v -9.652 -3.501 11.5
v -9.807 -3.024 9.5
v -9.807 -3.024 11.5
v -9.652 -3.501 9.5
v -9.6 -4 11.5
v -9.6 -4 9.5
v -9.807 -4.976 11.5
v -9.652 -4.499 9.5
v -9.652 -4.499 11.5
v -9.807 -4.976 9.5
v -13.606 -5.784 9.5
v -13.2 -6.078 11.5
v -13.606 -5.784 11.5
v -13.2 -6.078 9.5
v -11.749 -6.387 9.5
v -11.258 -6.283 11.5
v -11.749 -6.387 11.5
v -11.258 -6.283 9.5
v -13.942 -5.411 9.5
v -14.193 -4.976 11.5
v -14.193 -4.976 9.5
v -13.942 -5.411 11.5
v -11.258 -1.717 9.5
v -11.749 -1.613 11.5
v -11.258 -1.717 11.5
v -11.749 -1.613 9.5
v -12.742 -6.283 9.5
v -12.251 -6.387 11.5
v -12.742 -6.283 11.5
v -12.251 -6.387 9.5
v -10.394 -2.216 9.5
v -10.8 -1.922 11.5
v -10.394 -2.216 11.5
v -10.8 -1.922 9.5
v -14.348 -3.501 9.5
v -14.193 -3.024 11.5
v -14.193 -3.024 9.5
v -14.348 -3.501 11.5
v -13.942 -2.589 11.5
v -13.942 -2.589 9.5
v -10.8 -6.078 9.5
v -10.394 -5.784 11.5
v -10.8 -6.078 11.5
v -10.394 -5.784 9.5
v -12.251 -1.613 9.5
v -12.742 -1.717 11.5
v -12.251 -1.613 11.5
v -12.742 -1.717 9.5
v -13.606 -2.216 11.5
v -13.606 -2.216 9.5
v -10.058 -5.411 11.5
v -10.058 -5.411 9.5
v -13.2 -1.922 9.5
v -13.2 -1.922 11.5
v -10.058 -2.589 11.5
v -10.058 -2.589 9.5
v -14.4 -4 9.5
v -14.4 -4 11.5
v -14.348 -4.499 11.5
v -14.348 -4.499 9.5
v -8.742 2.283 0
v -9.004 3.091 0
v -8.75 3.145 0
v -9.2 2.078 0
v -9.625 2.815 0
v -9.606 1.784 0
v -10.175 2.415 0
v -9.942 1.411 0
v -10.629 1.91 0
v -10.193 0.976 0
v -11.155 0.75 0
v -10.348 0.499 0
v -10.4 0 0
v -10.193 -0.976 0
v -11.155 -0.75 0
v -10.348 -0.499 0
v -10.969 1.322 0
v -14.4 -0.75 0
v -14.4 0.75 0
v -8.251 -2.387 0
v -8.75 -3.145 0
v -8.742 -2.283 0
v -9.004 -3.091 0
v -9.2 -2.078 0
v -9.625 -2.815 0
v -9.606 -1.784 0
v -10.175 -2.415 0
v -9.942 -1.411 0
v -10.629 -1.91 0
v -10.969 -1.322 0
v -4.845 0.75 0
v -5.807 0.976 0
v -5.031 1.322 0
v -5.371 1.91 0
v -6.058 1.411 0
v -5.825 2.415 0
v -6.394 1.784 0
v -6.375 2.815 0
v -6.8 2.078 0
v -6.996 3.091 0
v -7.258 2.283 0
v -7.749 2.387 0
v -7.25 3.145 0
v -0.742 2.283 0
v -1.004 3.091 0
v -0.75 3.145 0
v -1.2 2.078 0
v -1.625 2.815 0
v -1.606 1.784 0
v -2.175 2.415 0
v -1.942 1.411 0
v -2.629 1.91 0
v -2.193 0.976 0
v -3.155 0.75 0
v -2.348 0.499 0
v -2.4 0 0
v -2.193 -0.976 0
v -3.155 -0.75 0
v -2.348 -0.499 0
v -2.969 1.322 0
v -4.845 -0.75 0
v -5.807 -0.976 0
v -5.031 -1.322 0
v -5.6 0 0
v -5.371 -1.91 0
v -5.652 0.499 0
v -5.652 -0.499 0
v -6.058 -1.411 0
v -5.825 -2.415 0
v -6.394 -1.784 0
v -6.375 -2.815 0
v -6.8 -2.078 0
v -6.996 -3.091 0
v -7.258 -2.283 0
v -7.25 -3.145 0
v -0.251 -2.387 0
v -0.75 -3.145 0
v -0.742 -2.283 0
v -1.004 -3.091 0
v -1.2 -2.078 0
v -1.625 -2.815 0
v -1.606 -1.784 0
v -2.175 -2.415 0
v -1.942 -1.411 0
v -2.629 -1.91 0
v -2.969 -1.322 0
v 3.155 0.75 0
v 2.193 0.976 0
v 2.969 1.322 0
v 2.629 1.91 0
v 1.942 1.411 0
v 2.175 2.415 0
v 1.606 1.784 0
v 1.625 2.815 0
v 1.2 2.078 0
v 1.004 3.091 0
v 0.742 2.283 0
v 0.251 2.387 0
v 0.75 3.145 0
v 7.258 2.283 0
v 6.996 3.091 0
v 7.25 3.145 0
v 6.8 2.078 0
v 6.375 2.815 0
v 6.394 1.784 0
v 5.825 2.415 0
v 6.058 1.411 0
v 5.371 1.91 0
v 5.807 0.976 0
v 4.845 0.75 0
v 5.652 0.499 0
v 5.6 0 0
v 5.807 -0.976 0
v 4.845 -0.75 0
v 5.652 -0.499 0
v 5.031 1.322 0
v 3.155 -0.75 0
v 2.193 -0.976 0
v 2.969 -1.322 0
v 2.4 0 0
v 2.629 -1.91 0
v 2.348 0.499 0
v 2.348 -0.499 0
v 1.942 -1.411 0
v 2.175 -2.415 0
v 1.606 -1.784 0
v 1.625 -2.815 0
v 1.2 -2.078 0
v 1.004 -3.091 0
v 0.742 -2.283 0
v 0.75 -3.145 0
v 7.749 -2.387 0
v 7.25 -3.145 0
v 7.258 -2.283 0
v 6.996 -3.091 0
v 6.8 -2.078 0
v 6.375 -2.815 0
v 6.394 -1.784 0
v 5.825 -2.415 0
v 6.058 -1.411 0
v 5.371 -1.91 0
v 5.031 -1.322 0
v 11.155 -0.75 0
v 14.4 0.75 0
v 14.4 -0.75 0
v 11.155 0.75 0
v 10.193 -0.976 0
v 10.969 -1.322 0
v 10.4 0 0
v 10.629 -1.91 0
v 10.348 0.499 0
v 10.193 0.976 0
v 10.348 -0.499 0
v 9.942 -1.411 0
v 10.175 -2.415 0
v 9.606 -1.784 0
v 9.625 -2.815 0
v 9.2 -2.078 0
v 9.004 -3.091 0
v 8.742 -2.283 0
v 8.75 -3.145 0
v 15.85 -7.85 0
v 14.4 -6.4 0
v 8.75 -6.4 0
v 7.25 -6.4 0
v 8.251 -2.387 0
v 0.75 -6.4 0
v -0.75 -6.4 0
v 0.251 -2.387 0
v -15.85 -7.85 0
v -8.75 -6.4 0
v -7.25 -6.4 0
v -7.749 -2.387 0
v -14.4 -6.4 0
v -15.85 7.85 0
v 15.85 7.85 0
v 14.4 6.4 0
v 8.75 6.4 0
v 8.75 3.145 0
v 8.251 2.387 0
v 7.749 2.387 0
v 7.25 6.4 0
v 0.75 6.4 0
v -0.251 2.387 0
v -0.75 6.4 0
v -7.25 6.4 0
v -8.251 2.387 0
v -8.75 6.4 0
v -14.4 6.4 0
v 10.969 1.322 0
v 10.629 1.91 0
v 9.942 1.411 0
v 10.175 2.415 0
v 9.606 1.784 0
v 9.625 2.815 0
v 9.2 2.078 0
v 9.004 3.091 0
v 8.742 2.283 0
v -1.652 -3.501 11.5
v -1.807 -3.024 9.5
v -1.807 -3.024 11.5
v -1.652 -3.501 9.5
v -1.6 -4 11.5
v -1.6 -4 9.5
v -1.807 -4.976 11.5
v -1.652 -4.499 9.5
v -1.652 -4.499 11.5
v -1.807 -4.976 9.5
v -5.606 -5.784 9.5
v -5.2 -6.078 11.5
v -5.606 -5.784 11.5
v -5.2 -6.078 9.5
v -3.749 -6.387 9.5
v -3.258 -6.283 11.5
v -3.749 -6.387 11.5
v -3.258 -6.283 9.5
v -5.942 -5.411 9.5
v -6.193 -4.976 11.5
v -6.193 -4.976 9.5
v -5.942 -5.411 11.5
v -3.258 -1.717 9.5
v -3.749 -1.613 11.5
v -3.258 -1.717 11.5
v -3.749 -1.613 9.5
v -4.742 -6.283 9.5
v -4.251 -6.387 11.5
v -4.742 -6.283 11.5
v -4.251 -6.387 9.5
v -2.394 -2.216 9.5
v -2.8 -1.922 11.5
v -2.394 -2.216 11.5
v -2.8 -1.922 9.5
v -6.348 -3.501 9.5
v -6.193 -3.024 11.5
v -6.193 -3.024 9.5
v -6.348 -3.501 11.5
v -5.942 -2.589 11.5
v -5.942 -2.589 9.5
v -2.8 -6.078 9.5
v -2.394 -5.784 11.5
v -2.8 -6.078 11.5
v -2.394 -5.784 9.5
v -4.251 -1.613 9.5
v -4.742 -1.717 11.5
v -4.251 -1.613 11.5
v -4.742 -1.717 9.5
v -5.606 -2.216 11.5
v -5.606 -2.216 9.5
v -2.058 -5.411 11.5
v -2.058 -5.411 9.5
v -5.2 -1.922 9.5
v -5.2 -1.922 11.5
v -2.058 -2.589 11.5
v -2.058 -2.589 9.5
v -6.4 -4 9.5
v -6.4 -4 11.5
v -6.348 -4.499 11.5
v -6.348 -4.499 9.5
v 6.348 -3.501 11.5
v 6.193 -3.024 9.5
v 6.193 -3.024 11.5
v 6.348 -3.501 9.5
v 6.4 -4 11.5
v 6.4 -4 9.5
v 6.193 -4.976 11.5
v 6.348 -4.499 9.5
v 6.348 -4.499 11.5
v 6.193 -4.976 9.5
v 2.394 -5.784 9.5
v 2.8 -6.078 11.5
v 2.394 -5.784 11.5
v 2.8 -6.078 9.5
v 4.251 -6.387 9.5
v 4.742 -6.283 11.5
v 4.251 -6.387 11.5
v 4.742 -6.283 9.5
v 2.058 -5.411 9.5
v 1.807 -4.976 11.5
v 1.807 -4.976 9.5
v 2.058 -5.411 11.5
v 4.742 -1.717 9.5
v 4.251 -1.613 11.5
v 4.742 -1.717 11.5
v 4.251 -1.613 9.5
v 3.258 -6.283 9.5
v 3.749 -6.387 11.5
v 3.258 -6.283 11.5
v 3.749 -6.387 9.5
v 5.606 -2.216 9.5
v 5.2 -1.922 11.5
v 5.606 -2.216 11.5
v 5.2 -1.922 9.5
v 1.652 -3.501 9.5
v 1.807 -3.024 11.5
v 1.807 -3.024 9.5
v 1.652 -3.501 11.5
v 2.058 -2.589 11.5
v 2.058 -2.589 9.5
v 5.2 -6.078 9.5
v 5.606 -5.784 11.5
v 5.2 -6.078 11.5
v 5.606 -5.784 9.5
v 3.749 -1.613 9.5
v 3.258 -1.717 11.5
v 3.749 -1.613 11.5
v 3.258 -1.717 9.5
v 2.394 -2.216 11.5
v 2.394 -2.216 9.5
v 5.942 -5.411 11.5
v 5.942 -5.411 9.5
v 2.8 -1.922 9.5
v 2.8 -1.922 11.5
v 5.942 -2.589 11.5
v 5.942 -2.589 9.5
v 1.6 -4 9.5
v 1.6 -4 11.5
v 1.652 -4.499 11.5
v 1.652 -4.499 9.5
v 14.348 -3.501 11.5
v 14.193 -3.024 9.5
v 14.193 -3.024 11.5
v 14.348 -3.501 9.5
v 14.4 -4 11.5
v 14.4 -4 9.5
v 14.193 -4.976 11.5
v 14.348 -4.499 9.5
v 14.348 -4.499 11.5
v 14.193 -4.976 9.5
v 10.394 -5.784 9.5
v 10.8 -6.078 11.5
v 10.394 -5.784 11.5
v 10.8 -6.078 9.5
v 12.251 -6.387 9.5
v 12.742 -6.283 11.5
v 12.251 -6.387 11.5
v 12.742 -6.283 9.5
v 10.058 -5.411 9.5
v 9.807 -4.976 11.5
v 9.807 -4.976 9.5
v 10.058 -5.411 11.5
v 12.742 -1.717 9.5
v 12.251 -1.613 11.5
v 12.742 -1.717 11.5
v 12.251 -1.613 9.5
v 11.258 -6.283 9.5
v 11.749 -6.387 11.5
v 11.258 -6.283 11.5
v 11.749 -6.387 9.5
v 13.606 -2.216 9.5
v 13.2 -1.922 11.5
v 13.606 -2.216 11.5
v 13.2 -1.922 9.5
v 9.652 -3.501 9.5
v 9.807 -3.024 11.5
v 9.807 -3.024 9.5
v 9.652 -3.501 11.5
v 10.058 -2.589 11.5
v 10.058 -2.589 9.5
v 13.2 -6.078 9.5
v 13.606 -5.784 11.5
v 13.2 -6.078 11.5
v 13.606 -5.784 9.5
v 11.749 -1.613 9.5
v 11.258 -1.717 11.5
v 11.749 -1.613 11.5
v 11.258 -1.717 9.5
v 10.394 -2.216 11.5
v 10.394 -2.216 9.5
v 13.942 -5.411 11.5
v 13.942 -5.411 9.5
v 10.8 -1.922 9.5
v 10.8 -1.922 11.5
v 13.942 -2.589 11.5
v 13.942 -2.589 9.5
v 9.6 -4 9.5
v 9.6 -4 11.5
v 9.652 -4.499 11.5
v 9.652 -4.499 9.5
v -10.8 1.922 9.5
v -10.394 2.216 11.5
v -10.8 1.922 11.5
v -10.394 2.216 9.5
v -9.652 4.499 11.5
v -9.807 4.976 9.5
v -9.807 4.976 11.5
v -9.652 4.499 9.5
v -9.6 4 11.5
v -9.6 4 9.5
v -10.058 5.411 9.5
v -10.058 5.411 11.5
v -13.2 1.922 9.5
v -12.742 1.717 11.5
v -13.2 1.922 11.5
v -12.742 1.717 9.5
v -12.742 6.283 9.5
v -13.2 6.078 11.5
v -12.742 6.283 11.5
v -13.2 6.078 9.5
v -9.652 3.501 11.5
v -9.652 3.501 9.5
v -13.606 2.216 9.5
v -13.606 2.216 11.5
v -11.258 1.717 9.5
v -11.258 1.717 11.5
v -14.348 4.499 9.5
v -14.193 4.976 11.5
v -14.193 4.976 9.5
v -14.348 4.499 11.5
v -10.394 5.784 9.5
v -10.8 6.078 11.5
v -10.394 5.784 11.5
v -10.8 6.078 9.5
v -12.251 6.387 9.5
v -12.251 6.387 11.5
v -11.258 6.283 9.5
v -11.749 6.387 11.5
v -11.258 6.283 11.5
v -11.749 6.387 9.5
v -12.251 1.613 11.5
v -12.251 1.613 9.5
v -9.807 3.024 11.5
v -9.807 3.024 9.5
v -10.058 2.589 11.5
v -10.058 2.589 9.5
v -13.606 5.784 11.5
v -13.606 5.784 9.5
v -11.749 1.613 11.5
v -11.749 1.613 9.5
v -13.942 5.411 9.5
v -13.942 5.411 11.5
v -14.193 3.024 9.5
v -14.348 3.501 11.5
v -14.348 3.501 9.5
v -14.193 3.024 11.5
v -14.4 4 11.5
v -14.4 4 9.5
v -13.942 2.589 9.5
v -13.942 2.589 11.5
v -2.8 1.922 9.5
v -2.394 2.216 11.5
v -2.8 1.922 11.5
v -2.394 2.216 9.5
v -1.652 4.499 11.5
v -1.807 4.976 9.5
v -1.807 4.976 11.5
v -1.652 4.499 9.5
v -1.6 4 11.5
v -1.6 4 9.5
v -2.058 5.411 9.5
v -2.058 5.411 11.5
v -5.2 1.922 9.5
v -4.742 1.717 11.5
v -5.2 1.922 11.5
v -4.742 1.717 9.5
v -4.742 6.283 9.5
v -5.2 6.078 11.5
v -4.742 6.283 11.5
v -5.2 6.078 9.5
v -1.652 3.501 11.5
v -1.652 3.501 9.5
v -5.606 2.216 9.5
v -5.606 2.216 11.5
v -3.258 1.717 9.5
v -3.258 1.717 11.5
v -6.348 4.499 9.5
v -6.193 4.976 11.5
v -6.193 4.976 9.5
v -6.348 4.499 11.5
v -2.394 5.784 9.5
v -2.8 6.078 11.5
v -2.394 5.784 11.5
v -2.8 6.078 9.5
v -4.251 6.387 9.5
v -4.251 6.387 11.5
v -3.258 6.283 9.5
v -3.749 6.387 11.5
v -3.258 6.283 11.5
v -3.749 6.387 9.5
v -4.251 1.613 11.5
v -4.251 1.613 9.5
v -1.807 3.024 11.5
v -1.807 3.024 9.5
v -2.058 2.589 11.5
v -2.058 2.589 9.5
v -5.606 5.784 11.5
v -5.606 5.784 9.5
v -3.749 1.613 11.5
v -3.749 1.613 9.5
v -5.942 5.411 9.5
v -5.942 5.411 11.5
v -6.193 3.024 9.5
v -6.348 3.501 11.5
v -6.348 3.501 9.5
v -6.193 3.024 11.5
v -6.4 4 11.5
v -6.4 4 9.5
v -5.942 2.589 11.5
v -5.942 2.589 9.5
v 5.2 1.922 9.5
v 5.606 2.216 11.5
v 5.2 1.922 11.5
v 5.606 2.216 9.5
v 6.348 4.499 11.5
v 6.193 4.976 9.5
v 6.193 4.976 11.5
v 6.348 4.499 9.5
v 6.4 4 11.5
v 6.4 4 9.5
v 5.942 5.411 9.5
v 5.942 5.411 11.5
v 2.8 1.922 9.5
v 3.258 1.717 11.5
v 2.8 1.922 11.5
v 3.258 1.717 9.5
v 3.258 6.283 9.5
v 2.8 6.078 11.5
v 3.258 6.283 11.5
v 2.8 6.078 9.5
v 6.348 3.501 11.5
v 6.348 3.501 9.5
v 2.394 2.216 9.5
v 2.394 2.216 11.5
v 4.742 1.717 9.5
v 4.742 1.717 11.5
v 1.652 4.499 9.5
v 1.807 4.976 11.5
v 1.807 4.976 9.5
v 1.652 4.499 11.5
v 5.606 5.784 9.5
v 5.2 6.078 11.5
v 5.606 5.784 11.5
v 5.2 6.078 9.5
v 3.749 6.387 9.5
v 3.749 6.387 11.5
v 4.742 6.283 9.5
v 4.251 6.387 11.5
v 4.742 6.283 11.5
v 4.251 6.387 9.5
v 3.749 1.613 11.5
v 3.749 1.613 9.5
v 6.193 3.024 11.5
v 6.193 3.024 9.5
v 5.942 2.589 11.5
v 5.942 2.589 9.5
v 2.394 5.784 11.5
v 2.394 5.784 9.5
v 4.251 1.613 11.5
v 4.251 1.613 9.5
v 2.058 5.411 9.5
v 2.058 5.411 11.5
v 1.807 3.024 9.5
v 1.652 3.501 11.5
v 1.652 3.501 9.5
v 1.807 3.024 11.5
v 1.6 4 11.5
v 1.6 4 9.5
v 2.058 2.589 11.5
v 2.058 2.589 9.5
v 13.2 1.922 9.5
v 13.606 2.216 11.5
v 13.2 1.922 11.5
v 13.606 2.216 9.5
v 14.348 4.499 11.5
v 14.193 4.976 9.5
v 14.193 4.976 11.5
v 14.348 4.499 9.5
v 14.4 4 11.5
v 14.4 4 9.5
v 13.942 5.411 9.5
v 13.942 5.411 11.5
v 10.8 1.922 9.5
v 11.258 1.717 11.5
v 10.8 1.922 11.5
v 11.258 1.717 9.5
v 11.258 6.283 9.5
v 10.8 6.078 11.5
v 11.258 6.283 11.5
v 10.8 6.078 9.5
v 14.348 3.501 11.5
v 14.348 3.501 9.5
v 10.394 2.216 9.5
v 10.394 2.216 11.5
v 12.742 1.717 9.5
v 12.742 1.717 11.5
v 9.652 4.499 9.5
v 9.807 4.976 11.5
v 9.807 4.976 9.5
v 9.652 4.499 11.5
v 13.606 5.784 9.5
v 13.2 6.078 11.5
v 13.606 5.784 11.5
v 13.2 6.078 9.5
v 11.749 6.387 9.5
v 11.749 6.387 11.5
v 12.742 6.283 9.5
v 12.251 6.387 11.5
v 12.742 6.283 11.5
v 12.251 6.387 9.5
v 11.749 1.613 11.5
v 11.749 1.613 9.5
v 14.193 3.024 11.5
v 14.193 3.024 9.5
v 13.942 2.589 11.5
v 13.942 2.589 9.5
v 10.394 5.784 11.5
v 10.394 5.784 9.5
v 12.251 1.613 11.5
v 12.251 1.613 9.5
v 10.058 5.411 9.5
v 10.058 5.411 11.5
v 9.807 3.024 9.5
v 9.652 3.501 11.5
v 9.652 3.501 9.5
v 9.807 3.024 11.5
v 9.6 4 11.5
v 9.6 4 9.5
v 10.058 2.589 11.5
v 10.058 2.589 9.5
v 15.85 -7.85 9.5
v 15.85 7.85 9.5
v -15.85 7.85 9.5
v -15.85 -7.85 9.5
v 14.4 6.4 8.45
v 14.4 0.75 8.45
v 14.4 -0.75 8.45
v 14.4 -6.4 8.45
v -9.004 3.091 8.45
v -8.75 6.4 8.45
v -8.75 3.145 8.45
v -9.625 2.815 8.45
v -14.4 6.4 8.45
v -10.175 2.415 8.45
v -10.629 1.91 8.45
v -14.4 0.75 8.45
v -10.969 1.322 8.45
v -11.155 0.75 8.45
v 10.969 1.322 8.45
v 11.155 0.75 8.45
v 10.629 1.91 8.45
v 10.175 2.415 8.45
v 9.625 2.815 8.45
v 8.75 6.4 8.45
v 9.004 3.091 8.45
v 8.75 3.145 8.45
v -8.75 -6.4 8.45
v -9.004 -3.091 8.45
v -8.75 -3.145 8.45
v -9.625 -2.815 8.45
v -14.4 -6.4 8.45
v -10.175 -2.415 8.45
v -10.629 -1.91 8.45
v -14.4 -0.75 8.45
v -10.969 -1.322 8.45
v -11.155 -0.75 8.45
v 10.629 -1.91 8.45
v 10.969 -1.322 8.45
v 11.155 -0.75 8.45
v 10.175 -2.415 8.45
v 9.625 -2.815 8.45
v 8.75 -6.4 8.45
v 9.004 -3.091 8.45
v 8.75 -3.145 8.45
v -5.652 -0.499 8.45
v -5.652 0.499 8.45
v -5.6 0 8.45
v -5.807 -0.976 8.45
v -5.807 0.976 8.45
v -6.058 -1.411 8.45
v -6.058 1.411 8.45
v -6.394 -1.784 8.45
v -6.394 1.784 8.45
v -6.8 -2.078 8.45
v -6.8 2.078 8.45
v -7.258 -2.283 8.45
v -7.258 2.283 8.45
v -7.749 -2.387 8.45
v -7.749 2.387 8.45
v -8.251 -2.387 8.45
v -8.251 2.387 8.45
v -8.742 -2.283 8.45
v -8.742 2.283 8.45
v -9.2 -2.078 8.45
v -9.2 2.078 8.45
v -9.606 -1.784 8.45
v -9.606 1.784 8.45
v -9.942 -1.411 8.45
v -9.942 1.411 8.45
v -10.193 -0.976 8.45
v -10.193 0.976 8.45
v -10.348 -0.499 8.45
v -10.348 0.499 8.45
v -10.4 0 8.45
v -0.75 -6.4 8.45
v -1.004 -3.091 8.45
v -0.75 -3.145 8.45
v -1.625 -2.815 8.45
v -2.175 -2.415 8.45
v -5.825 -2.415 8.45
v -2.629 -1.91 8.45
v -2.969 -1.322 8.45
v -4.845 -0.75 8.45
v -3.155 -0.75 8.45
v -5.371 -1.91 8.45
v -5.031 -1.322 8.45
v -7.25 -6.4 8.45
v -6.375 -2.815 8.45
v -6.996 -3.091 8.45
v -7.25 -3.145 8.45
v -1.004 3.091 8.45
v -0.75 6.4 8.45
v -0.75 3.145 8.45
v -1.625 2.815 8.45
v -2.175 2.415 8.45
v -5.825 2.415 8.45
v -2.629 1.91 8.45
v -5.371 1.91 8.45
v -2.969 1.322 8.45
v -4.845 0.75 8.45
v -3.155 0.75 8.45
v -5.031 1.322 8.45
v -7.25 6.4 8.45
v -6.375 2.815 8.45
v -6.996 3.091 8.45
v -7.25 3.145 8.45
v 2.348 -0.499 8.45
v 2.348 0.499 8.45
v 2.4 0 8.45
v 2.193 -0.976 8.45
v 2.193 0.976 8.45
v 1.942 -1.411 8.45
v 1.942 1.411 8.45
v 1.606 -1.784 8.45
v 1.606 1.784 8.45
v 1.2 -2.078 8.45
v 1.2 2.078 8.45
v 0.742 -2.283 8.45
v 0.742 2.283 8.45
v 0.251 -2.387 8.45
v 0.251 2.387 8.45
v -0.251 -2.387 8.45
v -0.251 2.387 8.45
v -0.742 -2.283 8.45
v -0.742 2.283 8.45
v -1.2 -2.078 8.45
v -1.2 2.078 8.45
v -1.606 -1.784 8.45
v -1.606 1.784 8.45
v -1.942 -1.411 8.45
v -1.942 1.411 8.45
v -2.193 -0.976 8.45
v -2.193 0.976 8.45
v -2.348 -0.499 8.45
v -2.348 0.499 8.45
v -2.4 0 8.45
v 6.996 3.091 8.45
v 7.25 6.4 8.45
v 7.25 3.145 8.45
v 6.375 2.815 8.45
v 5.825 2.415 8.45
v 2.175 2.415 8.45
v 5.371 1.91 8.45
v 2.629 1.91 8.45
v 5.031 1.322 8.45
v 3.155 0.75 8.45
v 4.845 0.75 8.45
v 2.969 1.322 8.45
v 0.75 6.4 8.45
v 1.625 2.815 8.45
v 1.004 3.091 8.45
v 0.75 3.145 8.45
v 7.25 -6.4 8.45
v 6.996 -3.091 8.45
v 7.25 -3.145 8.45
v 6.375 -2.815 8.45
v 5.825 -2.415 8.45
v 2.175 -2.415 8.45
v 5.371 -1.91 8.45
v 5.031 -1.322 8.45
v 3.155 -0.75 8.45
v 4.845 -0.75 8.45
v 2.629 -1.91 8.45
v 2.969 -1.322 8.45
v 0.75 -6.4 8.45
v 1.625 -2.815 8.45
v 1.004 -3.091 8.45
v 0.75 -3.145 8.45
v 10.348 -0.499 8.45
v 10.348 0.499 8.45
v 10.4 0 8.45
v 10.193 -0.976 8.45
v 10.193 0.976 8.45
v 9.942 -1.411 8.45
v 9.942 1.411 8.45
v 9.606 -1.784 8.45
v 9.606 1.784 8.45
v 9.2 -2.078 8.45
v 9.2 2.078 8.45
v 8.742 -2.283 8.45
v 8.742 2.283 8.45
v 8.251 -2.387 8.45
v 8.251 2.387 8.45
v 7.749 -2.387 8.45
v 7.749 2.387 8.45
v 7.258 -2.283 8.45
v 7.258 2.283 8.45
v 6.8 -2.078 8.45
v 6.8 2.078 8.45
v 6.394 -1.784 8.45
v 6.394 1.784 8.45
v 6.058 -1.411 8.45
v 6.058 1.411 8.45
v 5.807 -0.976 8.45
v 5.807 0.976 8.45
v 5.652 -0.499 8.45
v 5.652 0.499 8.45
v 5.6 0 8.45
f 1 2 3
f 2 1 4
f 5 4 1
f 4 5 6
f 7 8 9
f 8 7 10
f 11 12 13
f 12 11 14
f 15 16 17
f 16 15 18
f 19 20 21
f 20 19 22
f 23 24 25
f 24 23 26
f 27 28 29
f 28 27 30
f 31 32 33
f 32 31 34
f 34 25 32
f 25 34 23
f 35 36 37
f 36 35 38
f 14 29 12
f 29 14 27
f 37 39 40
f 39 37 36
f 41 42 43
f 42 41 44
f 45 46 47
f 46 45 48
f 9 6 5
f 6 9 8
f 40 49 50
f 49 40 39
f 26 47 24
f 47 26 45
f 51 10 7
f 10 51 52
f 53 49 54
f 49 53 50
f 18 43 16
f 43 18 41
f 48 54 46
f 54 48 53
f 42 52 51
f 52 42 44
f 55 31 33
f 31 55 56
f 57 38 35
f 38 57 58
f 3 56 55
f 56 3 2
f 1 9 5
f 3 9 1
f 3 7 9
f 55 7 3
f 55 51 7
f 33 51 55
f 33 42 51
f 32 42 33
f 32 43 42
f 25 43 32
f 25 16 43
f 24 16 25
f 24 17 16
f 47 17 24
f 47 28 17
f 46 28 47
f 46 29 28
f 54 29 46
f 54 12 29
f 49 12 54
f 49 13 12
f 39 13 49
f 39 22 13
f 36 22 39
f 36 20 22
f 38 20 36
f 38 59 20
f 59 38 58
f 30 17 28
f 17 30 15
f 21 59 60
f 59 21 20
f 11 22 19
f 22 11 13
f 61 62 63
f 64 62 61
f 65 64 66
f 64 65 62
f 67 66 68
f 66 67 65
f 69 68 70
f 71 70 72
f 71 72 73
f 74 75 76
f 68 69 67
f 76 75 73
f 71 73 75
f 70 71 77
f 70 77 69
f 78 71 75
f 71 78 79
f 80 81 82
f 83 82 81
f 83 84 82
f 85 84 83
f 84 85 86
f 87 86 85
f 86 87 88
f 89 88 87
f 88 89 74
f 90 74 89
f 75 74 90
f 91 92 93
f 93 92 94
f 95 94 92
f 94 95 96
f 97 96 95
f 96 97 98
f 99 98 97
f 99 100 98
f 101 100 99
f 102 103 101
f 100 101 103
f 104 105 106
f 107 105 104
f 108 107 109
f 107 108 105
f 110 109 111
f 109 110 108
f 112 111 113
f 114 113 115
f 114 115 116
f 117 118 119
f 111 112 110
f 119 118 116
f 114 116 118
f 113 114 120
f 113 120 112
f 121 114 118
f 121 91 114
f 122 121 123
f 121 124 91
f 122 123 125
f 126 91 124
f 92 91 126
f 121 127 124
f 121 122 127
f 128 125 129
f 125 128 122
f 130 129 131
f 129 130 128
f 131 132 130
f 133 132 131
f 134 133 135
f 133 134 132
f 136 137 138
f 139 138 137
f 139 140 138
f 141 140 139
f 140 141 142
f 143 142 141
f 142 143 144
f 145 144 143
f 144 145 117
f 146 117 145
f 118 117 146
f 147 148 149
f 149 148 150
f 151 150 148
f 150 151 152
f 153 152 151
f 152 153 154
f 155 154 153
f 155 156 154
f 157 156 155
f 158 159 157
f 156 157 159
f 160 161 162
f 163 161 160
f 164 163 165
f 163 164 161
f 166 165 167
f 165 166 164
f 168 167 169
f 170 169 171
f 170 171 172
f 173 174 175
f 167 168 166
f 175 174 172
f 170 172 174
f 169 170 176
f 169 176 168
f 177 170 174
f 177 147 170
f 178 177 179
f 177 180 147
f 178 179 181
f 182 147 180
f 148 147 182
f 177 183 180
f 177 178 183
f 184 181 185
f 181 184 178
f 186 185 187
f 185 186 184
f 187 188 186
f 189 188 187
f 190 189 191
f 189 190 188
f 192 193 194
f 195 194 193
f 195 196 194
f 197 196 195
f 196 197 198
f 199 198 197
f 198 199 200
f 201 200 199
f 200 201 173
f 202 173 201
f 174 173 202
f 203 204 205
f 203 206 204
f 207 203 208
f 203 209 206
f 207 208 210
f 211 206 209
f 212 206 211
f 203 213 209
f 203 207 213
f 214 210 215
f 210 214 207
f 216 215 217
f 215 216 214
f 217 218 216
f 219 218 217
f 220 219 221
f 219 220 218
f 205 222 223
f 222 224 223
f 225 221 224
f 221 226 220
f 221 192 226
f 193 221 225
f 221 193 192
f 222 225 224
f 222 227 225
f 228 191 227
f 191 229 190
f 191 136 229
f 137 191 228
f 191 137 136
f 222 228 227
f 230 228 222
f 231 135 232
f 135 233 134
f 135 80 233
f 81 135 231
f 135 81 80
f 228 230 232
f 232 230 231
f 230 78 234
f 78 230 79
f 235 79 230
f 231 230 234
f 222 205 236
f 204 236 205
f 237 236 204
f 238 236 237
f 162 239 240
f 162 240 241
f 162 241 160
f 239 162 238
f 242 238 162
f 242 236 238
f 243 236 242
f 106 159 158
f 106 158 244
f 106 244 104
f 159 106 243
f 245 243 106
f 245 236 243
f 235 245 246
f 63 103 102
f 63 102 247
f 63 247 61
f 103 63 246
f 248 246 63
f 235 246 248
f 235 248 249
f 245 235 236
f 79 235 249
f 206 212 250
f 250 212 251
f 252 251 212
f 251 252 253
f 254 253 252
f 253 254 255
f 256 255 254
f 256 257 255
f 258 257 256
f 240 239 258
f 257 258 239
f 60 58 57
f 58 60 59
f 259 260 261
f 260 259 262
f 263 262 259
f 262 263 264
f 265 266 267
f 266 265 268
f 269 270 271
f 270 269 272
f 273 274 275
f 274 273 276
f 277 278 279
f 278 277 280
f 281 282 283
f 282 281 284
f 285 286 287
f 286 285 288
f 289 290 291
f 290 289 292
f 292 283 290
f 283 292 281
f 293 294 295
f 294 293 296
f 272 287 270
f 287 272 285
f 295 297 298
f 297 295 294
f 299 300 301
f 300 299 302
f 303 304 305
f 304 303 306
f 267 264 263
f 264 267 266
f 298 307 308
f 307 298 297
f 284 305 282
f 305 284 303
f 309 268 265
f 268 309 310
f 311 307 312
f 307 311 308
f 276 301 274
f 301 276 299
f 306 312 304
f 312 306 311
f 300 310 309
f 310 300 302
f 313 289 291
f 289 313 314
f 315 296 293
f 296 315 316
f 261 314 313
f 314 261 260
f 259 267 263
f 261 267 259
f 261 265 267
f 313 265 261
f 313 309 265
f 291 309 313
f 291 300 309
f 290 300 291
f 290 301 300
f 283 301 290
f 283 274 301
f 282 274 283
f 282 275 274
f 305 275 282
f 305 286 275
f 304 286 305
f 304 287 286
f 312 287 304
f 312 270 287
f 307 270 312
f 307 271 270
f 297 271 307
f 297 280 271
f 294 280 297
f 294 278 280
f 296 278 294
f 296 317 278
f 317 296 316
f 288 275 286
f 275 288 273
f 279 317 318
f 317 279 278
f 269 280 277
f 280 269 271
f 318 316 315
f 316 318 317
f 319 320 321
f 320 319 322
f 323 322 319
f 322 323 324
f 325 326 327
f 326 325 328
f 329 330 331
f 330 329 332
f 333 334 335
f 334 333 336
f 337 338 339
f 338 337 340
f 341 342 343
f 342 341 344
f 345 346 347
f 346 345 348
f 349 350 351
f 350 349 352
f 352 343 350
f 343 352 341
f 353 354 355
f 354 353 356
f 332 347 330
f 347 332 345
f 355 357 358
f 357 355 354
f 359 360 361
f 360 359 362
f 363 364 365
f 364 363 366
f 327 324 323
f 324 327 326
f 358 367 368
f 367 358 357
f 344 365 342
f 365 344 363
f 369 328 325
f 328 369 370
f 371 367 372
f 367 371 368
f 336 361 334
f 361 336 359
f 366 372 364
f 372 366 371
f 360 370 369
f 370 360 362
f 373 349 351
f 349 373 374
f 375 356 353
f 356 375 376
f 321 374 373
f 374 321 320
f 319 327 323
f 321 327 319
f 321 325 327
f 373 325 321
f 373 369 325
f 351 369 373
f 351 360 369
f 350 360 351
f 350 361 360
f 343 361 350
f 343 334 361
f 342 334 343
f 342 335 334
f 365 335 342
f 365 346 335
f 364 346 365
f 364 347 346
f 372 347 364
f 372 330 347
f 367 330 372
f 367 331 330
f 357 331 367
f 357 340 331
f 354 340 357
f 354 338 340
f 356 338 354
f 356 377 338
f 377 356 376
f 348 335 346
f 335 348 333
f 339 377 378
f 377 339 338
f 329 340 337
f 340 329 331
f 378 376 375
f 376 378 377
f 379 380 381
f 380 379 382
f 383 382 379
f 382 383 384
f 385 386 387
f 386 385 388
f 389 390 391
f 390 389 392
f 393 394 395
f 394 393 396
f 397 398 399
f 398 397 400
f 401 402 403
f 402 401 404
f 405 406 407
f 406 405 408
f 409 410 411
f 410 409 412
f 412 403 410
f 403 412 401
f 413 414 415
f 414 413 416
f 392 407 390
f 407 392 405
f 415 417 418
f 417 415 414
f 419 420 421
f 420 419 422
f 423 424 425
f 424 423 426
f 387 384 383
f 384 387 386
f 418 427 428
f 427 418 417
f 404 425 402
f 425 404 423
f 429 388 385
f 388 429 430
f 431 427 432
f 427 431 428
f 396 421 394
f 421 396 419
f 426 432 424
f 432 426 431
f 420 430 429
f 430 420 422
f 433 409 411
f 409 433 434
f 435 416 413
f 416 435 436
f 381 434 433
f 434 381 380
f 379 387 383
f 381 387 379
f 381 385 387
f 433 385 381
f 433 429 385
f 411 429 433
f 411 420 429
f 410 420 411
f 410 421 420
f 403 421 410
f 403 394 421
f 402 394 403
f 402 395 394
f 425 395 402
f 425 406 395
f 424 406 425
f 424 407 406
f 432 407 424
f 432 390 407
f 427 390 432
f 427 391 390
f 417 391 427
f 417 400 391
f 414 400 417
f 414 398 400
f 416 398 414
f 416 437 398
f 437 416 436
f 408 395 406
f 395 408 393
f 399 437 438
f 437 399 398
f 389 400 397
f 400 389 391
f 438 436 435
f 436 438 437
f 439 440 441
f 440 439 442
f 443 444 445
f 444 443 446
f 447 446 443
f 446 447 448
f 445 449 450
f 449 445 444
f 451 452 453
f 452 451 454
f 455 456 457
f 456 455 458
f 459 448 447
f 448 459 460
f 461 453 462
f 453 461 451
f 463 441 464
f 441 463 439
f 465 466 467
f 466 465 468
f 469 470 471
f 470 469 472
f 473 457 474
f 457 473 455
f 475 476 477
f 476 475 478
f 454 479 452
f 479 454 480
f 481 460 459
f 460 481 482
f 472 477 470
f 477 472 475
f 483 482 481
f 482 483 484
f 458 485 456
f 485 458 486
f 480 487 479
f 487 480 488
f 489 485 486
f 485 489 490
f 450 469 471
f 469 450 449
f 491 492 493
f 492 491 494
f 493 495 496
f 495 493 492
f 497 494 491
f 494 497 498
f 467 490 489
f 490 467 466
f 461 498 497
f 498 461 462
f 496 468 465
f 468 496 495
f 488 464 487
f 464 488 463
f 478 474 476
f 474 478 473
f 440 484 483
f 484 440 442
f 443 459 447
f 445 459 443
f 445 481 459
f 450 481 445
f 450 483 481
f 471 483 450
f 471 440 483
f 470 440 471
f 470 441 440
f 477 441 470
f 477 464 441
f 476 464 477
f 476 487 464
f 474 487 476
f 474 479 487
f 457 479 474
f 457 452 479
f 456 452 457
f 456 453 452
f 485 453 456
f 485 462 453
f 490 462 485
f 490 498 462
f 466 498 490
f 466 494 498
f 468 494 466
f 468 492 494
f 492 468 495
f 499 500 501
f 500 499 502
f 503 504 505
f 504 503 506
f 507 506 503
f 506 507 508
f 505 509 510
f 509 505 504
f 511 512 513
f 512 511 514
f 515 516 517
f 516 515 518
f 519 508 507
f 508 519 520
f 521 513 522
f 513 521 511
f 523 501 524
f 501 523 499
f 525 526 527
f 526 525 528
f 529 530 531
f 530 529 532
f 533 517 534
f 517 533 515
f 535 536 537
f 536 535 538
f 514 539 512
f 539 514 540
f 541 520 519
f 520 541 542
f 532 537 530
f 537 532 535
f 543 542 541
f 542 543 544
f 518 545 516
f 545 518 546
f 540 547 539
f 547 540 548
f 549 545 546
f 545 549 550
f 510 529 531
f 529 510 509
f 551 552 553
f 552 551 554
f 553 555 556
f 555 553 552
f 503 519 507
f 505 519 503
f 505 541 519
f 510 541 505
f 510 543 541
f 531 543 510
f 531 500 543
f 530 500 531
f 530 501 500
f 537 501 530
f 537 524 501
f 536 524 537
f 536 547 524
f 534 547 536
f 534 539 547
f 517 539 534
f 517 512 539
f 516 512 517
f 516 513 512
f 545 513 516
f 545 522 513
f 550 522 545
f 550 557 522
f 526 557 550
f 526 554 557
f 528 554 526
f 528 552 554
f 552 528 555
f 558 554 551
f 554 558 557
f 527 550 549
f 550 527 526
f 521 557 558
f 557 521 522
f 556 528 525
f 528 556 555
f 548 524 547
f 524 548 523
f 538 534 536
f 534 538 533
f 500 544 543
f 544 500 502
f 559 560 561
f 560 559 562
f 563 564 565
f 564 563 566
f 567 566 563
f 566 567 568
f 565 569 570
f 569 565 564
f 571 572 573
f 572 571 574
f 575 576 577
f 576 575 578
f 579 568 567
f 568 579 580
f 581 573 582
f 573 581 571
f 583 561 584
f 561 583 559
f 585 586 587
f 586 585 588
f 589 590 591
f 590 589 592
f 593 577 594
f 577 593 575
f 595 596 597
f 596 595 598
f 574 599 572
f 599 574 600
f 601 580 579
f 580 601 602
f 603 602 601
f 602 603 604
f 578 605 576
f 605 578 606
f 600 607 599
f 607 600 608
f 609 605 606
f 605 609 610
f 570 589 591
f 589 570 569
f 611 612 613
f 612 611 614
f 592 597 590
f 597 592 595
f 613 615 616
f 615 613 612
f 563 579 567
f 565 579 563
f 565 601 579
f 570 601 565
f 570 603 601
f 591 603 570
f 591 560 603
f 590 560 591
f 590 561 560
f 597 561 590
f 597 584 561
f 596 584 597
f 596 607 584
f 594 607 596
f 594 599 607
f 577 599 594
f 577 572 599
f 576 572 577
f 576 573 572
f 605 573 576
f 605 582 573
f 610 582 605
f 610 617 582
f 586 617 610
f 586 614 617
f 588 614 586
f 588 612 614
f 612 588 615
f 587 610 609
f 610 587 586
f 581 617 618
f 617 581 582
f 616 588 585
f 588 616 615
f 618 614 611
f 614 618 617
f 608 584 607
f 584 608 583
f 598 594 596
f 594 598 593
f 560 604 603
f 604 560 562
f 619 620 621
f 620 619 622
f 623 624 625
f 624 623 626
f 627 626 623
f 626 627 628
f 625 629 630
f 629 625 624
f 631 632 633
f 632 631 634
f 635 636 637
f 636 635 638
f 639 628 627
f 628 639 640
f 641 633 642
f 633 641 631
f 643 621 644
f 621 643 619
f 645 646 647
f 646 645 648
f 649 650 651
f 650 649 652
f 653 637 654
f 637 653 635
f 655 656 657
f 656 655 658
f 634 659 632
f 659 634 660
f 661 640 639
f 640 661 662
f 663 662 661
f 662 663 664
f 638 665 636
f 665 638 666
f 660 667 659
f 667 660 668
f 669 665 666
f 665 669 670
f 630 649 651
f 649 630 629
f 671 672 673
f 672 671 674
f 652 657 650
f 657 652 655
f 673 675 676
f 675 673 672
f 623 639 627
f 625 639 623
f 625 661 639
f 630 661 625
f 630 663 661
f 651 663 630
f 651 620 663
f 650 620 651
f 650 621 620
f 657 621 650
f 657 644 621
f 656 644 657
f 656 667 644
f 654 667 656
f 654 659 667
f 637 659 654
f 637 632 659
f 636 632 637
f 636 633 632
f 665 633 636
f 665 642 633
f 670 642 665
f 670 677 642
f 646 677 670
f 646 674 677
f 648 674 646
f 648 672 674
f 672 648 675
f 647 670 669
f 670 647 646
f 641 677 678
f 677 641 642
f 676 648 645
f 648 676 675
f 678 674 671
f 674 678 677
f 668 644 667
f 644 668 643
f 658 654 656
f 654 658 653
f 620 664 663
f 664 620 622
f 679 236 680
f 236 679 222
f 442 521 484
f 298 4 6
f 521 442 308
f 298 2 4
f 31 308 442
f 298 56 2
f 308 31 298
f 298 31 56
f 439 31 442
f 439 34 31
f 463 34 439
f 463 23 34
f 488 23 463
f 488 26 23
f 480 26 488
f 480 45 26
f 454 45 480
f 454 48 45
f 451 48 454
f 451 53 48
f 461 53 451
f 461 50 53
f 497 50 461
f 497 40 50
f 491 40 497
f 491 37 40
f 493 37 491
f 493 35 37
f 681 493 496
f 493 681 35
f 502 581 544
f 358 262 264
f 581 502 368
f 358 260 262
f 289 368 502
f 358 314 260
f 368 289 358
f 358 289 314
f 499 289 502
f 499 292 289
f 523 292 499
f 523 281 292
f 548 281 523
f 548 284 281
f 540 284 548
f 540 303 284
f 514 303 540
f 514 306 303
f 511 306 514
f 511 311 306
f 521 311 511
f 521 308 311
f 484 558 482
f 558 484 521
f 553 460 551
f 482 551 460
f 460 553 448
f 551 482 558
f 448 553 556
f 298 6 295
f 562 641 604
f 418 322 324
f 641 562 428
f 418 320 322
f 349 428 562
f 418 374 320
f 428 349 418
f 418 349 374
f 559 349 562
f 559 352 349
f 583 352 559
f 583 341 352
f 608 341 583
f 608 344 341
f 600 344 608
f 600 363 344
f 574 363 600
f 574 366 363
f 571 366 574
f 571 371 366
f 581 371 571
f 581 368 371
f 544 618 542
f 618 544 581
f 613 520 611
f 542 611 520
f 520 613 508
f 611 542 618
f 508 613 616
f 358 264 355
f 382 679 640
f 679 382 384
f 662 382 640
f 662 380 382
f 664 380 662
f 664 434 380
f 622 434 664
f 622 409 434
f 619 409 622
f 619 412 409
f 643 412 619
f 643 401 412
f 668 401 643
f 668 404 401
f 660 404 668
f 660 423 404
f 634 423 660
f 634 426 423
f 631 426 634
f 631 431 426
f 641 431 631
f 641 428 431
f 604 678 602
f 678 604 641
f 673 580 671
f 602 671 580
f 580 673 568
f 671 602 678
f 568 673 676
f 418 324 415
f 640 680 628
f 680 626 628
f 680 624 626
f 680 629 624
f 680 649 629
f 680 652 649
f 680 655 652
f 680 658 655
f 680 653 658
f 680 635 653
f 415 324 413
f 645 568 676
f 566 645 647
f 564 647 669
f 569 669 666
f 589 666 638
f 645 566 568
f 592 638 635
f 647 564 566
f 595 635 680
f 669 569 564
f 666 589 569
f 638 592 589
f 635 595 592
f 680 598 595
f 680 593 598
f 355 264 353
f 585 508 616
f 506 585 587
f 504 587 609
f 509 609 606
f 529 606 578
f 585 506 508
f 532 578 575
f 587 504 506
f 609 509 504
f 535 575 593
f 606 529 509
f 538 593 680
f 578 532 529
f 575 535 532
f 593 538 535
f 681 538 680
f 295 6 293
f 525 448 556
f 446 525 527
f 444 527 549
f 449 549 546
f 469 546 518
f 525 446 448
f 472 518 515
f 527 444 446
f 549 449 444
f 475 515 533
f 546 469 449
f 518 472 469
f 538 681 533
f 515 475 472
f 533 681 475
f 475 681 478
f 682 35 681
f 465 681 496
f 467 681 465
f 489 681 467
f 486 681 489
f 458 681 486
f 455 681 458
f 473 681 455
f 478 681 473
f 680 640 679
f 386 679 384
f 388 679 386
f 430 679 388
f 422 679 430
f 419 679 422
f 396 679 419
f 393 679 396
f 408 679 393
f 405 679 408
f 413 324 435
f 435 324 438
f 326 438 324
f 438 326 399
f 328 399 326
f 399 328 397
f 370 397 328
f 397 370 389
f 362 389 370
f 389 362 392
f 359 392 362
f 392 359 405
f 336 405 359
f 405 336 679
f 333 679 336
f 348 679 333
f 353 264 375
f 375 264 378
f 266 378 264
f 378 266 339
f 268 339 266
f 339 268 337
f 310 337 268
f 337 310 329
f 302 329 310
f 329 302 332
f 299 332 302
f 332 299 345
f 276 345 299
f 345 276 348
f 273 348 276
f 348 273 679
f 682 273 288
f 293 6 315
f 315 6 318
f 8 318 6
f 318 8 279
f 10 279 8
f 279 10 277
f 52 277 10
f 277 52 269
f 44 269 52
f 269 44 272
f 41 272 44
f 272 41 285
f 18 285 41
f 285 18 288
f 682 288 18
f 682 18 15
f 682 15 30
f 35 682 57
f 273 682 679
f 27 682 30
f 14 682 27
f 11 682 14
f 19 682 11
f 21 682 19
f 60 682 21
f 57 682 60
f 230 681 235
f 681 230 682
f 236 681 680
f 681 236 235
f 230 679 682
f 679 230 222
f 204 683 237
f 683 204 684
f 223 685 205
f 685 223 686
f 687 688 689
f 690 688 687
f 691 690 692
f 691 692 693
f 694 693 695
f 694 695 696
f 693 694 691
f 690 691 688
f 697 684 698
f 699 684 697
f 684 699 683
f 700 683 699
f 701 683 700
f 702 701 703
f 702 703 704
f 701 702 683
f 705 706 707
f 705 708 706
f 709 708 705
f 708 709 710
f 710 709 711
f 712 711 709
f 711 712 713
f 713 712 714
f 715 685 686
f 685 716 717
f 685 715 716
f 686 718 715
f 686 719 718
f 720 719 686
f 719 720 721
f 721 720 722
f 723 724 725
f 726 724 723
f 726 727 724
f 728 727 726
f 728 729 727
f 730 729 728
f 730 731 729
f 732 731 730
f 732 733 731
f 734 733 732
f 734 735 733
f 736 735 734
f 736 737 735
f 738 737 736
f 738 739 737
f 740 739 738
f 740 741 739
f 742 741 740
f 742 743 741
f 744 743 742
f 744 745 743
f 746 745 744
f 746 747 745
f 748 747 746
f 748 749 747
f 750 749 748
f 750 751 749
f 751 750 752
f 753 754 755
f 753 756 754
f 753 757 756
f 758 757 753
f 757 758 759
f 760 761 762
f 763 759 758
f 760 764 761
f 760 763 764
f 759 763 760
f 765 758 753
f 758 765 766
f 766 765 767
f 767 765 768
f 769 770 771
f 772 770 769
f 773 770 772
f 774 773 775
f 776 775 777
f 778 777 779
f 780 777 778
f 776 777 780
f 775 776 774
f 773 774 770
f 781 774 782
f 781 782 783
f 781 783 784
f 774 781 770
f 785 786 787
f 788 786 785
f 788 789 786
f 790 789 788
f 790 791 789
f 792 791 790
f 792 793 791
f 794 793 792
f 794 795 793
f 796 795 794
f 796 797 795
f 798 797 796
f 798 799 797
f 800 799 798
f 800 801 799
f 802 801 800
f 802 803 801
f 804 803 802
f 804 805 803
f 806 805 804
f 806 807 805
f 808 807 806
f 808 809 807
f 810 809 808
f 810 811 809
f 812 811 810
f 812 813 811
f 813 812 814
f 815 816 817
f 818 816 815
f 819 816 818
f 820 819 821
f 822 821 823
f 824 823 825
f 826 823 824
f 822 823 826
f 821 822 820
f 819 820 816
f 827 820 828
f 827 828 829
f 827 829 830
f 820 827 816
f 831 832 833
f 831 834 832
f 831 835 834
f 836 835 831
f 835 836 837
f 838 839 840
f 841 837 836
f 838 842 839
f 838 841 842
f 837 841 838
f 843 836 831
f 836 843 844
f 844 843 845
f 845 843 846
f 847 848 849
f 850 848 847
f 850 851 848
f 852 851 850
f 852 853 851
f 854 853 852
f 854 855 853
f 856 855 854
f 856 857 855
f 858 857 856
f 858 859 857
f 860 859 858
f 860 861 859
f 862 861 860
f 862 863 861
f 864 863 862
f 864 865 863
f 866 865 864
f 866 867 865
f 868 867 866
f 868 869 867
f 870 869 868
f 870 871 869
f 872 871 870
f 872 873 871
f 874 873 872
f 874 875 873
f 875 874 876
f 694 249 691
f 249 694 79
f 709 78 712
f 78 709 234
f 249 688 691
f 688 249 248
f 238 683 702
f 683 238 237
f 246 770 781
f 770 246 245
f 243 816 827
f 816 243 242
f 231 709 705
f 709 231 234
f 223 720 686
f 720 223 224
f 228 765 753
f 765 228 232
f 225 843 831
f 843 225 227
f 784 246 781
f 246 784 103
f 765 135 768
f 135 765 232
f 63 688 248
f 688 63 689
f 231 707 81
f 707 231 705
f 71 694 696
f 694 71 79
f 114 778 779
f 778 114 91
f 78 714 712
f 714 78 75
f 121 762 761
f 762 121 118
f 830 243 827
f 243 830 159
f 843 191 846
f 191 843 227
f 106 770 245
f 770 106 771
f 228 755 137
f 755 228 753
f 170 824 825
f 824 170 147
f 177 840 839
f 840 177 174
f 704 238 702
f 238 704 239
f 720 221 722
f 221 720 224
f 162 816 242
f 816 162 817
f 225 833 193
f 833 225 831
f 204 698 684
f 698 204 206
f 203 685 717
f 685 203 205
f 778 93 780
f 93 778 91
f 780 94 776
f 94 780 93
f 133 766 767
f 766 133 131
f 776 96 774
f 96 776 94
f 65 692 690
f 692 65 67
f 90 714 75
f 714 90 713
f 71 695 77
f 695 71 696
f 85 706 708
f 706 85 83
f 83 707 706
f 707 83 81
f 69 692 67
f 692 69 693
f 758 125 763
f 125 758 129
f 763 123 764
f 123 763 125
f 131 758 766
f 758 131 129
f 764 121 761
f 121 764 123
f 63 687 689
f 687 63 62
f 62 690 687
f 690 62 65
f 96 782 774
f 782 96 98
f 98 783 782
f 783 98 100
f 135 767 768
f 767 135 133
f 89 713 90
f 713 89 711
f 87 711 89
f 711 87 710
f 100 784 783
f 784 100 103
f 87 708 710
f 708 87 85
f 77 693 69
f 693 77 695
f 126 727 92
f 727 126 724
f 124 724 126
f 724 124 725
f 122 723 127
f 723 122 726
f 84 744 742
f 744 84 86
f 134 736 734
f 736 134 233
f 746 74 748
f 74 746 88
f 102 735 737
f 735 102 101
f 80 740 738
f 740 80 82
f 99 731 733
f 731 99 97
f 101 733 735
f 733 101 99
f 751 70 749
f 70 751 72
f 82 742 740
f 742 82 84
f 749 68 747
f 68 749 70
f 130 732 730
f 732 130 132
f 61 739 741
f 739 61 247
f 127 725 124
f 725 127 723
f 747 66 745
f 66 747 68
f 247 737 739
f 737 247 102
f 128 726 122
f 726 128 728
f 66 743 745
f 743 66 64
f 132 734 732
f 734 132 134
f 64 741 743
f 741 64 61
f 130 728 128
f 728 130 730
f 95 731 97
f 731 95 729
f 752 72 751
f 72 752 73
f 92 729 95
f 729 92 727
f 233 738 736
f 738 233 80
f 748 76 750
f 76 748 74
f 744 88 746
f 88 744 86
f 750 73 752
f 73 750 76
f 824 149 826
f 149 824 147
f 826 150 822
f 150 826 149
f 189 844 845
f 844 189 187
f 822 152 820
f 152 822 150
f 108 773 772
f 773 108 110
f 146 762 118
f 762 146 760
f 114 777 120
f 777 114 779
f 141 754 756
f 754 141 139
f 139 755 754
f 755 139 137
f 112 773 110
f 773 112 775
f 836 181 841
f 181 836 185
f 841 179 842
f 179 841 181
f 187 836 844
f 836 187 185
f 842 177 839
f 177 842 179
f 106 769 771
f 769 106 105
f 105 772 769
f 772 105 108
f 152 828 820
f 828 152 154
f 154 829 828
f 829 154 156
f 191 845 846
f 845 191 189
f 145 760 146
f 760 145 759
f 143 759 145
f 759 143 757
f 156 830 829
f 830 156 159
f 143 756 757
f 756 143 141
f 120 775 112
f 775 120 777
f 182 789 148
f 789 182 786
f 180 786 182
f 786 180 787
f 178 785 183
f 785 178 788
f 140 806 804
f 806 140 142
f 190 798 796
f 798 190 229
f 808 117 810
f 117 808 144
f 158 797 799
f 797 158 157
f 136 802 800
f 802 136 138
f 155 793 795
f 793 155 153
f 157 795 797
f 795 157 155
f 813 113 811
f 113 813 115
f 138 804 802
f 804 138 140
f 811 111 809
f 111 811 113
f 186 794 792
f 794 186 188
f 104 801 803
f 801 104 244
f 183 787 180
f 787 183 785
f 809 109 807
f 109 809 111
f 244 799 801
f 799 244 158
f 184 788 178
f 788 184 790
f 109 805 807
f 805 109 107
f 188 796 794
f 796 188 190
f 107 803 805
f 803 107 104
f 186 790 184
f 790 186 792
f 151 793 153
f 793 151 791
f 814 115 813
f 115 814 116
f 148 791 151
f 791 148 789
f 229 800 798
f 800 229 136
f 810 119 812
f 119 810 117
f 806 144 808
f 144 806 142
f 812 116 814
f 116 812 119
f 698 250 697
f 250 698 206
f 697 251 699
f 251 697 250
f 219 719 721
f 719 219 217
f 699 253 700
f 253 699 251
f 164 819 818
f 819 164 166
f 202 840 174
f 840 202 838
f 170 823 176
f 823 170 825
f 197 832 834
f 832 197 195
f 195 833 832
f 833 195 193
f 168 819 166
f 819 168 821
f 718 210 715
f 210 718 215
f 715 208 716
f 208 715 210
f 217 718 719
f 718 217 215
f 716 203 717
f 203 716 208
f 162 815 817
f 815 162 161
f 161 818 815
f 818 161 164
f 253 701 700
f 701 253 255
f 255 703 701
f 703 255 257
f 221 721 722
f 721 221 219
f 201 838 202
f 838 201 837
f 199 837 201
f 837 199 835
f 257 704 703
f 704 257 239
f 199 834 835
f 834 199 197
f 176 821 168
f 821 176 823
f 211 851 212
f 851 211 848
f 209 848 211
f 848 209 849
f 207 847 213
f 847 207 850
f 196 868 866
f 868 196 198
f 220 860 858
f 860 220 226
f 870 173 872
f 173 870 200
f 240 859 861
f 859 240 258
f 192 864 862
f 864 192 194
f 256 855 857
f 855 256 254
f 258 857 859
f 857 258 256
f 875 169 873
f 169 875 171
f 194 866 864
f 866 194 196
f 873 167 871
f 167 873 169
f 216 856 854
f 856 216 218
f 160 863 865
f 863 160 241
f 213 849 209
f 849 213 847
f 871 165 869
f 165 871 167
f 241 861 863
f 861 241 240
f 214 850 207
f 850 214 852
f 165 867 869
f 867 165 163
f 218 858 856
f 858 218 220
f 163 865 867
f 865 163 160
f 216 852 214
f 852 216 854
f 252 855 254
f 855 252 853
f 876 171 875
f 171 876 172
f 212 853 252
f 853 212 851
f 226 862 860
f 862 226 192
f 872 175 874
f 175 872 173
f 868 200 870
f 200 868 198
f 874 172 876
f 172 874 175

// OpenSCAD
// Created by Ian Garrison (Cool_Stuff on Thingiverse)

// Lego Brick Length
brick_length = 4; // 1,2,3,4,5,6,7,8,9,10,11,12,13,14,15,16

// Lego Brick Width
brick_width = 2; // 1,2,3,4,5,6,7,8,9,10,11,12,13,14,15,16

knob_diameter=4.8;		//knobs on top of blocks
knob_height=2;
knob_spacing=8.0;
wall_thickness=1.45;
roof_thickness=1.05;
block_height=9.5;
pin_diameter=3;		//pin for bottom blocks with width or length of 1
post_diameter=6.5;
reinforcing_width=1.5;
axle_spline_width=2.0;
axle_diameter=5;
cylinder_precision=0.1;

block(brick_width,brick_length,1,axle_hole=false,reinforcement=true);

module block(width,length,height,axle_hole,reinforcement) {
	overall_length=(length-1)*knob_spacing+knob_diameter+wall_thickness*2;
	overall_width=(width-1)*knob_spacing+knob_diameter+wall_thickness*2;
	start=(knob_diameter/2+knob_spacing/2+wall_thickness);
	translate([-overall_length/2,-overall_width/2,0])
		union() {
			difference() {
				union() {
					cube([overall_length,overall_width,height*block_height]);
					translate([knob_diameter/2+wall_thickness,knob_diameter/2+wall_thickness,0]) 
						for (ycount=[0:width-1])
							for (xcount=[0:length-1]) {
								translate([xcount*knob_spacing,ycount*knob_spacing,0])
									cylinder(r=knob_diameter/2,h=block_height*height+knob_height,$fs=cylinder_precision);
						}
				}
				translate([wall_thickness,wall_thickness,-roof_thickness]) cube([overall_length-wall_thickness*2,overall_width-wall_thickness*2,block_height*height]);
				if (axle_hole==true)
					if (width>1 && length>1) for (ycount=[1:width-1])
						for (xcount=[1:length-1])
							translate([(xcount-1)*knob_spacing+start,(ycount-1)*knob_spacing+start,-block_height/2])  axle(height+1);
			}
	
			if (reinforcement==true && width>1 && length>1)
				difference() {
					for (ycount=[1:width-1])
						for (xcount=[1:length-1])
							translate([(xcount-1)*knob_spacing+start,(ycount-1)*knob_spacing+start,0]) reinforcement(height);
					for (ycount=[1:width-1])
						for (xcount=[1:length-1])
							translate([(xcount-1)*knob_spacing+start,(ycount-1)*knob_spacing+start,-0.5]) cylinder(r=post_diameter/2-0.1, h=height*block_height+0.5, $fs=cylinder_precision);
				}
	
			if (width>1 && length>1) for (ycount=[1:width-1])
				for (xcount=[1:length-1])
					translate([(xcount-1)*knob_spacing+start,(ycount-1)*knob_spacing+start,0]) post(height,axle_hole);
	
			if (width==1 && length!=1)
				for (xcount=[1:length-1])
					translate([(xcount-1)*knob_spacing+start,overall_width/2,0]) cylinder(r=pin_diameter/2,h=block_height*height,$fs=cylinder_precision);
	
			if (length==1 && width!=1)
				for (ycount=[1:width-1])
					translate([overall_length/2,(ycount-1)*knob_spacing+start,0]) cylinder(r=pin_diameter/2,h=block_height*height,$fs=cylinder_precision);
		}
}

module post(height,axle_hole=false) {
	difference() {
		cylinder(r=post_diameter/2, h=height*block_height,$fs=cylinder_precision);
		if (axle_hole==true) {
			translate([0,0,-block_height/2])
				axle(height+1);
		} else {
			translate([0,0,-0.5])
				cylinder(r=knob_diameter/2, h=height*block_height+1,$fs=cylinder_precision);
		}
	}
}

module reinforcement(height) {
	union() {
		translate([0,0,height*block_height/2]) union() {
			cube([reinforcing_width,knob_spacing+knob_diameter+wall_thickness/2,height*block_height],center=true);
			rotate(v=[0,0,1],a=90) cube([reinforcing_width,knob_spacing+knob_diameter+wall_thickness/2,height*block_height], center=true);
		}
	}
}

module axle(height) {
	translate([0,0,height*block_height/2]) union() {
		cube([axle_diameter,axle_spline_width,height*block_height],center=true);
		cube([axle_spline_width,axle_diameter,height*block_height],center=true);
	}
}
			
